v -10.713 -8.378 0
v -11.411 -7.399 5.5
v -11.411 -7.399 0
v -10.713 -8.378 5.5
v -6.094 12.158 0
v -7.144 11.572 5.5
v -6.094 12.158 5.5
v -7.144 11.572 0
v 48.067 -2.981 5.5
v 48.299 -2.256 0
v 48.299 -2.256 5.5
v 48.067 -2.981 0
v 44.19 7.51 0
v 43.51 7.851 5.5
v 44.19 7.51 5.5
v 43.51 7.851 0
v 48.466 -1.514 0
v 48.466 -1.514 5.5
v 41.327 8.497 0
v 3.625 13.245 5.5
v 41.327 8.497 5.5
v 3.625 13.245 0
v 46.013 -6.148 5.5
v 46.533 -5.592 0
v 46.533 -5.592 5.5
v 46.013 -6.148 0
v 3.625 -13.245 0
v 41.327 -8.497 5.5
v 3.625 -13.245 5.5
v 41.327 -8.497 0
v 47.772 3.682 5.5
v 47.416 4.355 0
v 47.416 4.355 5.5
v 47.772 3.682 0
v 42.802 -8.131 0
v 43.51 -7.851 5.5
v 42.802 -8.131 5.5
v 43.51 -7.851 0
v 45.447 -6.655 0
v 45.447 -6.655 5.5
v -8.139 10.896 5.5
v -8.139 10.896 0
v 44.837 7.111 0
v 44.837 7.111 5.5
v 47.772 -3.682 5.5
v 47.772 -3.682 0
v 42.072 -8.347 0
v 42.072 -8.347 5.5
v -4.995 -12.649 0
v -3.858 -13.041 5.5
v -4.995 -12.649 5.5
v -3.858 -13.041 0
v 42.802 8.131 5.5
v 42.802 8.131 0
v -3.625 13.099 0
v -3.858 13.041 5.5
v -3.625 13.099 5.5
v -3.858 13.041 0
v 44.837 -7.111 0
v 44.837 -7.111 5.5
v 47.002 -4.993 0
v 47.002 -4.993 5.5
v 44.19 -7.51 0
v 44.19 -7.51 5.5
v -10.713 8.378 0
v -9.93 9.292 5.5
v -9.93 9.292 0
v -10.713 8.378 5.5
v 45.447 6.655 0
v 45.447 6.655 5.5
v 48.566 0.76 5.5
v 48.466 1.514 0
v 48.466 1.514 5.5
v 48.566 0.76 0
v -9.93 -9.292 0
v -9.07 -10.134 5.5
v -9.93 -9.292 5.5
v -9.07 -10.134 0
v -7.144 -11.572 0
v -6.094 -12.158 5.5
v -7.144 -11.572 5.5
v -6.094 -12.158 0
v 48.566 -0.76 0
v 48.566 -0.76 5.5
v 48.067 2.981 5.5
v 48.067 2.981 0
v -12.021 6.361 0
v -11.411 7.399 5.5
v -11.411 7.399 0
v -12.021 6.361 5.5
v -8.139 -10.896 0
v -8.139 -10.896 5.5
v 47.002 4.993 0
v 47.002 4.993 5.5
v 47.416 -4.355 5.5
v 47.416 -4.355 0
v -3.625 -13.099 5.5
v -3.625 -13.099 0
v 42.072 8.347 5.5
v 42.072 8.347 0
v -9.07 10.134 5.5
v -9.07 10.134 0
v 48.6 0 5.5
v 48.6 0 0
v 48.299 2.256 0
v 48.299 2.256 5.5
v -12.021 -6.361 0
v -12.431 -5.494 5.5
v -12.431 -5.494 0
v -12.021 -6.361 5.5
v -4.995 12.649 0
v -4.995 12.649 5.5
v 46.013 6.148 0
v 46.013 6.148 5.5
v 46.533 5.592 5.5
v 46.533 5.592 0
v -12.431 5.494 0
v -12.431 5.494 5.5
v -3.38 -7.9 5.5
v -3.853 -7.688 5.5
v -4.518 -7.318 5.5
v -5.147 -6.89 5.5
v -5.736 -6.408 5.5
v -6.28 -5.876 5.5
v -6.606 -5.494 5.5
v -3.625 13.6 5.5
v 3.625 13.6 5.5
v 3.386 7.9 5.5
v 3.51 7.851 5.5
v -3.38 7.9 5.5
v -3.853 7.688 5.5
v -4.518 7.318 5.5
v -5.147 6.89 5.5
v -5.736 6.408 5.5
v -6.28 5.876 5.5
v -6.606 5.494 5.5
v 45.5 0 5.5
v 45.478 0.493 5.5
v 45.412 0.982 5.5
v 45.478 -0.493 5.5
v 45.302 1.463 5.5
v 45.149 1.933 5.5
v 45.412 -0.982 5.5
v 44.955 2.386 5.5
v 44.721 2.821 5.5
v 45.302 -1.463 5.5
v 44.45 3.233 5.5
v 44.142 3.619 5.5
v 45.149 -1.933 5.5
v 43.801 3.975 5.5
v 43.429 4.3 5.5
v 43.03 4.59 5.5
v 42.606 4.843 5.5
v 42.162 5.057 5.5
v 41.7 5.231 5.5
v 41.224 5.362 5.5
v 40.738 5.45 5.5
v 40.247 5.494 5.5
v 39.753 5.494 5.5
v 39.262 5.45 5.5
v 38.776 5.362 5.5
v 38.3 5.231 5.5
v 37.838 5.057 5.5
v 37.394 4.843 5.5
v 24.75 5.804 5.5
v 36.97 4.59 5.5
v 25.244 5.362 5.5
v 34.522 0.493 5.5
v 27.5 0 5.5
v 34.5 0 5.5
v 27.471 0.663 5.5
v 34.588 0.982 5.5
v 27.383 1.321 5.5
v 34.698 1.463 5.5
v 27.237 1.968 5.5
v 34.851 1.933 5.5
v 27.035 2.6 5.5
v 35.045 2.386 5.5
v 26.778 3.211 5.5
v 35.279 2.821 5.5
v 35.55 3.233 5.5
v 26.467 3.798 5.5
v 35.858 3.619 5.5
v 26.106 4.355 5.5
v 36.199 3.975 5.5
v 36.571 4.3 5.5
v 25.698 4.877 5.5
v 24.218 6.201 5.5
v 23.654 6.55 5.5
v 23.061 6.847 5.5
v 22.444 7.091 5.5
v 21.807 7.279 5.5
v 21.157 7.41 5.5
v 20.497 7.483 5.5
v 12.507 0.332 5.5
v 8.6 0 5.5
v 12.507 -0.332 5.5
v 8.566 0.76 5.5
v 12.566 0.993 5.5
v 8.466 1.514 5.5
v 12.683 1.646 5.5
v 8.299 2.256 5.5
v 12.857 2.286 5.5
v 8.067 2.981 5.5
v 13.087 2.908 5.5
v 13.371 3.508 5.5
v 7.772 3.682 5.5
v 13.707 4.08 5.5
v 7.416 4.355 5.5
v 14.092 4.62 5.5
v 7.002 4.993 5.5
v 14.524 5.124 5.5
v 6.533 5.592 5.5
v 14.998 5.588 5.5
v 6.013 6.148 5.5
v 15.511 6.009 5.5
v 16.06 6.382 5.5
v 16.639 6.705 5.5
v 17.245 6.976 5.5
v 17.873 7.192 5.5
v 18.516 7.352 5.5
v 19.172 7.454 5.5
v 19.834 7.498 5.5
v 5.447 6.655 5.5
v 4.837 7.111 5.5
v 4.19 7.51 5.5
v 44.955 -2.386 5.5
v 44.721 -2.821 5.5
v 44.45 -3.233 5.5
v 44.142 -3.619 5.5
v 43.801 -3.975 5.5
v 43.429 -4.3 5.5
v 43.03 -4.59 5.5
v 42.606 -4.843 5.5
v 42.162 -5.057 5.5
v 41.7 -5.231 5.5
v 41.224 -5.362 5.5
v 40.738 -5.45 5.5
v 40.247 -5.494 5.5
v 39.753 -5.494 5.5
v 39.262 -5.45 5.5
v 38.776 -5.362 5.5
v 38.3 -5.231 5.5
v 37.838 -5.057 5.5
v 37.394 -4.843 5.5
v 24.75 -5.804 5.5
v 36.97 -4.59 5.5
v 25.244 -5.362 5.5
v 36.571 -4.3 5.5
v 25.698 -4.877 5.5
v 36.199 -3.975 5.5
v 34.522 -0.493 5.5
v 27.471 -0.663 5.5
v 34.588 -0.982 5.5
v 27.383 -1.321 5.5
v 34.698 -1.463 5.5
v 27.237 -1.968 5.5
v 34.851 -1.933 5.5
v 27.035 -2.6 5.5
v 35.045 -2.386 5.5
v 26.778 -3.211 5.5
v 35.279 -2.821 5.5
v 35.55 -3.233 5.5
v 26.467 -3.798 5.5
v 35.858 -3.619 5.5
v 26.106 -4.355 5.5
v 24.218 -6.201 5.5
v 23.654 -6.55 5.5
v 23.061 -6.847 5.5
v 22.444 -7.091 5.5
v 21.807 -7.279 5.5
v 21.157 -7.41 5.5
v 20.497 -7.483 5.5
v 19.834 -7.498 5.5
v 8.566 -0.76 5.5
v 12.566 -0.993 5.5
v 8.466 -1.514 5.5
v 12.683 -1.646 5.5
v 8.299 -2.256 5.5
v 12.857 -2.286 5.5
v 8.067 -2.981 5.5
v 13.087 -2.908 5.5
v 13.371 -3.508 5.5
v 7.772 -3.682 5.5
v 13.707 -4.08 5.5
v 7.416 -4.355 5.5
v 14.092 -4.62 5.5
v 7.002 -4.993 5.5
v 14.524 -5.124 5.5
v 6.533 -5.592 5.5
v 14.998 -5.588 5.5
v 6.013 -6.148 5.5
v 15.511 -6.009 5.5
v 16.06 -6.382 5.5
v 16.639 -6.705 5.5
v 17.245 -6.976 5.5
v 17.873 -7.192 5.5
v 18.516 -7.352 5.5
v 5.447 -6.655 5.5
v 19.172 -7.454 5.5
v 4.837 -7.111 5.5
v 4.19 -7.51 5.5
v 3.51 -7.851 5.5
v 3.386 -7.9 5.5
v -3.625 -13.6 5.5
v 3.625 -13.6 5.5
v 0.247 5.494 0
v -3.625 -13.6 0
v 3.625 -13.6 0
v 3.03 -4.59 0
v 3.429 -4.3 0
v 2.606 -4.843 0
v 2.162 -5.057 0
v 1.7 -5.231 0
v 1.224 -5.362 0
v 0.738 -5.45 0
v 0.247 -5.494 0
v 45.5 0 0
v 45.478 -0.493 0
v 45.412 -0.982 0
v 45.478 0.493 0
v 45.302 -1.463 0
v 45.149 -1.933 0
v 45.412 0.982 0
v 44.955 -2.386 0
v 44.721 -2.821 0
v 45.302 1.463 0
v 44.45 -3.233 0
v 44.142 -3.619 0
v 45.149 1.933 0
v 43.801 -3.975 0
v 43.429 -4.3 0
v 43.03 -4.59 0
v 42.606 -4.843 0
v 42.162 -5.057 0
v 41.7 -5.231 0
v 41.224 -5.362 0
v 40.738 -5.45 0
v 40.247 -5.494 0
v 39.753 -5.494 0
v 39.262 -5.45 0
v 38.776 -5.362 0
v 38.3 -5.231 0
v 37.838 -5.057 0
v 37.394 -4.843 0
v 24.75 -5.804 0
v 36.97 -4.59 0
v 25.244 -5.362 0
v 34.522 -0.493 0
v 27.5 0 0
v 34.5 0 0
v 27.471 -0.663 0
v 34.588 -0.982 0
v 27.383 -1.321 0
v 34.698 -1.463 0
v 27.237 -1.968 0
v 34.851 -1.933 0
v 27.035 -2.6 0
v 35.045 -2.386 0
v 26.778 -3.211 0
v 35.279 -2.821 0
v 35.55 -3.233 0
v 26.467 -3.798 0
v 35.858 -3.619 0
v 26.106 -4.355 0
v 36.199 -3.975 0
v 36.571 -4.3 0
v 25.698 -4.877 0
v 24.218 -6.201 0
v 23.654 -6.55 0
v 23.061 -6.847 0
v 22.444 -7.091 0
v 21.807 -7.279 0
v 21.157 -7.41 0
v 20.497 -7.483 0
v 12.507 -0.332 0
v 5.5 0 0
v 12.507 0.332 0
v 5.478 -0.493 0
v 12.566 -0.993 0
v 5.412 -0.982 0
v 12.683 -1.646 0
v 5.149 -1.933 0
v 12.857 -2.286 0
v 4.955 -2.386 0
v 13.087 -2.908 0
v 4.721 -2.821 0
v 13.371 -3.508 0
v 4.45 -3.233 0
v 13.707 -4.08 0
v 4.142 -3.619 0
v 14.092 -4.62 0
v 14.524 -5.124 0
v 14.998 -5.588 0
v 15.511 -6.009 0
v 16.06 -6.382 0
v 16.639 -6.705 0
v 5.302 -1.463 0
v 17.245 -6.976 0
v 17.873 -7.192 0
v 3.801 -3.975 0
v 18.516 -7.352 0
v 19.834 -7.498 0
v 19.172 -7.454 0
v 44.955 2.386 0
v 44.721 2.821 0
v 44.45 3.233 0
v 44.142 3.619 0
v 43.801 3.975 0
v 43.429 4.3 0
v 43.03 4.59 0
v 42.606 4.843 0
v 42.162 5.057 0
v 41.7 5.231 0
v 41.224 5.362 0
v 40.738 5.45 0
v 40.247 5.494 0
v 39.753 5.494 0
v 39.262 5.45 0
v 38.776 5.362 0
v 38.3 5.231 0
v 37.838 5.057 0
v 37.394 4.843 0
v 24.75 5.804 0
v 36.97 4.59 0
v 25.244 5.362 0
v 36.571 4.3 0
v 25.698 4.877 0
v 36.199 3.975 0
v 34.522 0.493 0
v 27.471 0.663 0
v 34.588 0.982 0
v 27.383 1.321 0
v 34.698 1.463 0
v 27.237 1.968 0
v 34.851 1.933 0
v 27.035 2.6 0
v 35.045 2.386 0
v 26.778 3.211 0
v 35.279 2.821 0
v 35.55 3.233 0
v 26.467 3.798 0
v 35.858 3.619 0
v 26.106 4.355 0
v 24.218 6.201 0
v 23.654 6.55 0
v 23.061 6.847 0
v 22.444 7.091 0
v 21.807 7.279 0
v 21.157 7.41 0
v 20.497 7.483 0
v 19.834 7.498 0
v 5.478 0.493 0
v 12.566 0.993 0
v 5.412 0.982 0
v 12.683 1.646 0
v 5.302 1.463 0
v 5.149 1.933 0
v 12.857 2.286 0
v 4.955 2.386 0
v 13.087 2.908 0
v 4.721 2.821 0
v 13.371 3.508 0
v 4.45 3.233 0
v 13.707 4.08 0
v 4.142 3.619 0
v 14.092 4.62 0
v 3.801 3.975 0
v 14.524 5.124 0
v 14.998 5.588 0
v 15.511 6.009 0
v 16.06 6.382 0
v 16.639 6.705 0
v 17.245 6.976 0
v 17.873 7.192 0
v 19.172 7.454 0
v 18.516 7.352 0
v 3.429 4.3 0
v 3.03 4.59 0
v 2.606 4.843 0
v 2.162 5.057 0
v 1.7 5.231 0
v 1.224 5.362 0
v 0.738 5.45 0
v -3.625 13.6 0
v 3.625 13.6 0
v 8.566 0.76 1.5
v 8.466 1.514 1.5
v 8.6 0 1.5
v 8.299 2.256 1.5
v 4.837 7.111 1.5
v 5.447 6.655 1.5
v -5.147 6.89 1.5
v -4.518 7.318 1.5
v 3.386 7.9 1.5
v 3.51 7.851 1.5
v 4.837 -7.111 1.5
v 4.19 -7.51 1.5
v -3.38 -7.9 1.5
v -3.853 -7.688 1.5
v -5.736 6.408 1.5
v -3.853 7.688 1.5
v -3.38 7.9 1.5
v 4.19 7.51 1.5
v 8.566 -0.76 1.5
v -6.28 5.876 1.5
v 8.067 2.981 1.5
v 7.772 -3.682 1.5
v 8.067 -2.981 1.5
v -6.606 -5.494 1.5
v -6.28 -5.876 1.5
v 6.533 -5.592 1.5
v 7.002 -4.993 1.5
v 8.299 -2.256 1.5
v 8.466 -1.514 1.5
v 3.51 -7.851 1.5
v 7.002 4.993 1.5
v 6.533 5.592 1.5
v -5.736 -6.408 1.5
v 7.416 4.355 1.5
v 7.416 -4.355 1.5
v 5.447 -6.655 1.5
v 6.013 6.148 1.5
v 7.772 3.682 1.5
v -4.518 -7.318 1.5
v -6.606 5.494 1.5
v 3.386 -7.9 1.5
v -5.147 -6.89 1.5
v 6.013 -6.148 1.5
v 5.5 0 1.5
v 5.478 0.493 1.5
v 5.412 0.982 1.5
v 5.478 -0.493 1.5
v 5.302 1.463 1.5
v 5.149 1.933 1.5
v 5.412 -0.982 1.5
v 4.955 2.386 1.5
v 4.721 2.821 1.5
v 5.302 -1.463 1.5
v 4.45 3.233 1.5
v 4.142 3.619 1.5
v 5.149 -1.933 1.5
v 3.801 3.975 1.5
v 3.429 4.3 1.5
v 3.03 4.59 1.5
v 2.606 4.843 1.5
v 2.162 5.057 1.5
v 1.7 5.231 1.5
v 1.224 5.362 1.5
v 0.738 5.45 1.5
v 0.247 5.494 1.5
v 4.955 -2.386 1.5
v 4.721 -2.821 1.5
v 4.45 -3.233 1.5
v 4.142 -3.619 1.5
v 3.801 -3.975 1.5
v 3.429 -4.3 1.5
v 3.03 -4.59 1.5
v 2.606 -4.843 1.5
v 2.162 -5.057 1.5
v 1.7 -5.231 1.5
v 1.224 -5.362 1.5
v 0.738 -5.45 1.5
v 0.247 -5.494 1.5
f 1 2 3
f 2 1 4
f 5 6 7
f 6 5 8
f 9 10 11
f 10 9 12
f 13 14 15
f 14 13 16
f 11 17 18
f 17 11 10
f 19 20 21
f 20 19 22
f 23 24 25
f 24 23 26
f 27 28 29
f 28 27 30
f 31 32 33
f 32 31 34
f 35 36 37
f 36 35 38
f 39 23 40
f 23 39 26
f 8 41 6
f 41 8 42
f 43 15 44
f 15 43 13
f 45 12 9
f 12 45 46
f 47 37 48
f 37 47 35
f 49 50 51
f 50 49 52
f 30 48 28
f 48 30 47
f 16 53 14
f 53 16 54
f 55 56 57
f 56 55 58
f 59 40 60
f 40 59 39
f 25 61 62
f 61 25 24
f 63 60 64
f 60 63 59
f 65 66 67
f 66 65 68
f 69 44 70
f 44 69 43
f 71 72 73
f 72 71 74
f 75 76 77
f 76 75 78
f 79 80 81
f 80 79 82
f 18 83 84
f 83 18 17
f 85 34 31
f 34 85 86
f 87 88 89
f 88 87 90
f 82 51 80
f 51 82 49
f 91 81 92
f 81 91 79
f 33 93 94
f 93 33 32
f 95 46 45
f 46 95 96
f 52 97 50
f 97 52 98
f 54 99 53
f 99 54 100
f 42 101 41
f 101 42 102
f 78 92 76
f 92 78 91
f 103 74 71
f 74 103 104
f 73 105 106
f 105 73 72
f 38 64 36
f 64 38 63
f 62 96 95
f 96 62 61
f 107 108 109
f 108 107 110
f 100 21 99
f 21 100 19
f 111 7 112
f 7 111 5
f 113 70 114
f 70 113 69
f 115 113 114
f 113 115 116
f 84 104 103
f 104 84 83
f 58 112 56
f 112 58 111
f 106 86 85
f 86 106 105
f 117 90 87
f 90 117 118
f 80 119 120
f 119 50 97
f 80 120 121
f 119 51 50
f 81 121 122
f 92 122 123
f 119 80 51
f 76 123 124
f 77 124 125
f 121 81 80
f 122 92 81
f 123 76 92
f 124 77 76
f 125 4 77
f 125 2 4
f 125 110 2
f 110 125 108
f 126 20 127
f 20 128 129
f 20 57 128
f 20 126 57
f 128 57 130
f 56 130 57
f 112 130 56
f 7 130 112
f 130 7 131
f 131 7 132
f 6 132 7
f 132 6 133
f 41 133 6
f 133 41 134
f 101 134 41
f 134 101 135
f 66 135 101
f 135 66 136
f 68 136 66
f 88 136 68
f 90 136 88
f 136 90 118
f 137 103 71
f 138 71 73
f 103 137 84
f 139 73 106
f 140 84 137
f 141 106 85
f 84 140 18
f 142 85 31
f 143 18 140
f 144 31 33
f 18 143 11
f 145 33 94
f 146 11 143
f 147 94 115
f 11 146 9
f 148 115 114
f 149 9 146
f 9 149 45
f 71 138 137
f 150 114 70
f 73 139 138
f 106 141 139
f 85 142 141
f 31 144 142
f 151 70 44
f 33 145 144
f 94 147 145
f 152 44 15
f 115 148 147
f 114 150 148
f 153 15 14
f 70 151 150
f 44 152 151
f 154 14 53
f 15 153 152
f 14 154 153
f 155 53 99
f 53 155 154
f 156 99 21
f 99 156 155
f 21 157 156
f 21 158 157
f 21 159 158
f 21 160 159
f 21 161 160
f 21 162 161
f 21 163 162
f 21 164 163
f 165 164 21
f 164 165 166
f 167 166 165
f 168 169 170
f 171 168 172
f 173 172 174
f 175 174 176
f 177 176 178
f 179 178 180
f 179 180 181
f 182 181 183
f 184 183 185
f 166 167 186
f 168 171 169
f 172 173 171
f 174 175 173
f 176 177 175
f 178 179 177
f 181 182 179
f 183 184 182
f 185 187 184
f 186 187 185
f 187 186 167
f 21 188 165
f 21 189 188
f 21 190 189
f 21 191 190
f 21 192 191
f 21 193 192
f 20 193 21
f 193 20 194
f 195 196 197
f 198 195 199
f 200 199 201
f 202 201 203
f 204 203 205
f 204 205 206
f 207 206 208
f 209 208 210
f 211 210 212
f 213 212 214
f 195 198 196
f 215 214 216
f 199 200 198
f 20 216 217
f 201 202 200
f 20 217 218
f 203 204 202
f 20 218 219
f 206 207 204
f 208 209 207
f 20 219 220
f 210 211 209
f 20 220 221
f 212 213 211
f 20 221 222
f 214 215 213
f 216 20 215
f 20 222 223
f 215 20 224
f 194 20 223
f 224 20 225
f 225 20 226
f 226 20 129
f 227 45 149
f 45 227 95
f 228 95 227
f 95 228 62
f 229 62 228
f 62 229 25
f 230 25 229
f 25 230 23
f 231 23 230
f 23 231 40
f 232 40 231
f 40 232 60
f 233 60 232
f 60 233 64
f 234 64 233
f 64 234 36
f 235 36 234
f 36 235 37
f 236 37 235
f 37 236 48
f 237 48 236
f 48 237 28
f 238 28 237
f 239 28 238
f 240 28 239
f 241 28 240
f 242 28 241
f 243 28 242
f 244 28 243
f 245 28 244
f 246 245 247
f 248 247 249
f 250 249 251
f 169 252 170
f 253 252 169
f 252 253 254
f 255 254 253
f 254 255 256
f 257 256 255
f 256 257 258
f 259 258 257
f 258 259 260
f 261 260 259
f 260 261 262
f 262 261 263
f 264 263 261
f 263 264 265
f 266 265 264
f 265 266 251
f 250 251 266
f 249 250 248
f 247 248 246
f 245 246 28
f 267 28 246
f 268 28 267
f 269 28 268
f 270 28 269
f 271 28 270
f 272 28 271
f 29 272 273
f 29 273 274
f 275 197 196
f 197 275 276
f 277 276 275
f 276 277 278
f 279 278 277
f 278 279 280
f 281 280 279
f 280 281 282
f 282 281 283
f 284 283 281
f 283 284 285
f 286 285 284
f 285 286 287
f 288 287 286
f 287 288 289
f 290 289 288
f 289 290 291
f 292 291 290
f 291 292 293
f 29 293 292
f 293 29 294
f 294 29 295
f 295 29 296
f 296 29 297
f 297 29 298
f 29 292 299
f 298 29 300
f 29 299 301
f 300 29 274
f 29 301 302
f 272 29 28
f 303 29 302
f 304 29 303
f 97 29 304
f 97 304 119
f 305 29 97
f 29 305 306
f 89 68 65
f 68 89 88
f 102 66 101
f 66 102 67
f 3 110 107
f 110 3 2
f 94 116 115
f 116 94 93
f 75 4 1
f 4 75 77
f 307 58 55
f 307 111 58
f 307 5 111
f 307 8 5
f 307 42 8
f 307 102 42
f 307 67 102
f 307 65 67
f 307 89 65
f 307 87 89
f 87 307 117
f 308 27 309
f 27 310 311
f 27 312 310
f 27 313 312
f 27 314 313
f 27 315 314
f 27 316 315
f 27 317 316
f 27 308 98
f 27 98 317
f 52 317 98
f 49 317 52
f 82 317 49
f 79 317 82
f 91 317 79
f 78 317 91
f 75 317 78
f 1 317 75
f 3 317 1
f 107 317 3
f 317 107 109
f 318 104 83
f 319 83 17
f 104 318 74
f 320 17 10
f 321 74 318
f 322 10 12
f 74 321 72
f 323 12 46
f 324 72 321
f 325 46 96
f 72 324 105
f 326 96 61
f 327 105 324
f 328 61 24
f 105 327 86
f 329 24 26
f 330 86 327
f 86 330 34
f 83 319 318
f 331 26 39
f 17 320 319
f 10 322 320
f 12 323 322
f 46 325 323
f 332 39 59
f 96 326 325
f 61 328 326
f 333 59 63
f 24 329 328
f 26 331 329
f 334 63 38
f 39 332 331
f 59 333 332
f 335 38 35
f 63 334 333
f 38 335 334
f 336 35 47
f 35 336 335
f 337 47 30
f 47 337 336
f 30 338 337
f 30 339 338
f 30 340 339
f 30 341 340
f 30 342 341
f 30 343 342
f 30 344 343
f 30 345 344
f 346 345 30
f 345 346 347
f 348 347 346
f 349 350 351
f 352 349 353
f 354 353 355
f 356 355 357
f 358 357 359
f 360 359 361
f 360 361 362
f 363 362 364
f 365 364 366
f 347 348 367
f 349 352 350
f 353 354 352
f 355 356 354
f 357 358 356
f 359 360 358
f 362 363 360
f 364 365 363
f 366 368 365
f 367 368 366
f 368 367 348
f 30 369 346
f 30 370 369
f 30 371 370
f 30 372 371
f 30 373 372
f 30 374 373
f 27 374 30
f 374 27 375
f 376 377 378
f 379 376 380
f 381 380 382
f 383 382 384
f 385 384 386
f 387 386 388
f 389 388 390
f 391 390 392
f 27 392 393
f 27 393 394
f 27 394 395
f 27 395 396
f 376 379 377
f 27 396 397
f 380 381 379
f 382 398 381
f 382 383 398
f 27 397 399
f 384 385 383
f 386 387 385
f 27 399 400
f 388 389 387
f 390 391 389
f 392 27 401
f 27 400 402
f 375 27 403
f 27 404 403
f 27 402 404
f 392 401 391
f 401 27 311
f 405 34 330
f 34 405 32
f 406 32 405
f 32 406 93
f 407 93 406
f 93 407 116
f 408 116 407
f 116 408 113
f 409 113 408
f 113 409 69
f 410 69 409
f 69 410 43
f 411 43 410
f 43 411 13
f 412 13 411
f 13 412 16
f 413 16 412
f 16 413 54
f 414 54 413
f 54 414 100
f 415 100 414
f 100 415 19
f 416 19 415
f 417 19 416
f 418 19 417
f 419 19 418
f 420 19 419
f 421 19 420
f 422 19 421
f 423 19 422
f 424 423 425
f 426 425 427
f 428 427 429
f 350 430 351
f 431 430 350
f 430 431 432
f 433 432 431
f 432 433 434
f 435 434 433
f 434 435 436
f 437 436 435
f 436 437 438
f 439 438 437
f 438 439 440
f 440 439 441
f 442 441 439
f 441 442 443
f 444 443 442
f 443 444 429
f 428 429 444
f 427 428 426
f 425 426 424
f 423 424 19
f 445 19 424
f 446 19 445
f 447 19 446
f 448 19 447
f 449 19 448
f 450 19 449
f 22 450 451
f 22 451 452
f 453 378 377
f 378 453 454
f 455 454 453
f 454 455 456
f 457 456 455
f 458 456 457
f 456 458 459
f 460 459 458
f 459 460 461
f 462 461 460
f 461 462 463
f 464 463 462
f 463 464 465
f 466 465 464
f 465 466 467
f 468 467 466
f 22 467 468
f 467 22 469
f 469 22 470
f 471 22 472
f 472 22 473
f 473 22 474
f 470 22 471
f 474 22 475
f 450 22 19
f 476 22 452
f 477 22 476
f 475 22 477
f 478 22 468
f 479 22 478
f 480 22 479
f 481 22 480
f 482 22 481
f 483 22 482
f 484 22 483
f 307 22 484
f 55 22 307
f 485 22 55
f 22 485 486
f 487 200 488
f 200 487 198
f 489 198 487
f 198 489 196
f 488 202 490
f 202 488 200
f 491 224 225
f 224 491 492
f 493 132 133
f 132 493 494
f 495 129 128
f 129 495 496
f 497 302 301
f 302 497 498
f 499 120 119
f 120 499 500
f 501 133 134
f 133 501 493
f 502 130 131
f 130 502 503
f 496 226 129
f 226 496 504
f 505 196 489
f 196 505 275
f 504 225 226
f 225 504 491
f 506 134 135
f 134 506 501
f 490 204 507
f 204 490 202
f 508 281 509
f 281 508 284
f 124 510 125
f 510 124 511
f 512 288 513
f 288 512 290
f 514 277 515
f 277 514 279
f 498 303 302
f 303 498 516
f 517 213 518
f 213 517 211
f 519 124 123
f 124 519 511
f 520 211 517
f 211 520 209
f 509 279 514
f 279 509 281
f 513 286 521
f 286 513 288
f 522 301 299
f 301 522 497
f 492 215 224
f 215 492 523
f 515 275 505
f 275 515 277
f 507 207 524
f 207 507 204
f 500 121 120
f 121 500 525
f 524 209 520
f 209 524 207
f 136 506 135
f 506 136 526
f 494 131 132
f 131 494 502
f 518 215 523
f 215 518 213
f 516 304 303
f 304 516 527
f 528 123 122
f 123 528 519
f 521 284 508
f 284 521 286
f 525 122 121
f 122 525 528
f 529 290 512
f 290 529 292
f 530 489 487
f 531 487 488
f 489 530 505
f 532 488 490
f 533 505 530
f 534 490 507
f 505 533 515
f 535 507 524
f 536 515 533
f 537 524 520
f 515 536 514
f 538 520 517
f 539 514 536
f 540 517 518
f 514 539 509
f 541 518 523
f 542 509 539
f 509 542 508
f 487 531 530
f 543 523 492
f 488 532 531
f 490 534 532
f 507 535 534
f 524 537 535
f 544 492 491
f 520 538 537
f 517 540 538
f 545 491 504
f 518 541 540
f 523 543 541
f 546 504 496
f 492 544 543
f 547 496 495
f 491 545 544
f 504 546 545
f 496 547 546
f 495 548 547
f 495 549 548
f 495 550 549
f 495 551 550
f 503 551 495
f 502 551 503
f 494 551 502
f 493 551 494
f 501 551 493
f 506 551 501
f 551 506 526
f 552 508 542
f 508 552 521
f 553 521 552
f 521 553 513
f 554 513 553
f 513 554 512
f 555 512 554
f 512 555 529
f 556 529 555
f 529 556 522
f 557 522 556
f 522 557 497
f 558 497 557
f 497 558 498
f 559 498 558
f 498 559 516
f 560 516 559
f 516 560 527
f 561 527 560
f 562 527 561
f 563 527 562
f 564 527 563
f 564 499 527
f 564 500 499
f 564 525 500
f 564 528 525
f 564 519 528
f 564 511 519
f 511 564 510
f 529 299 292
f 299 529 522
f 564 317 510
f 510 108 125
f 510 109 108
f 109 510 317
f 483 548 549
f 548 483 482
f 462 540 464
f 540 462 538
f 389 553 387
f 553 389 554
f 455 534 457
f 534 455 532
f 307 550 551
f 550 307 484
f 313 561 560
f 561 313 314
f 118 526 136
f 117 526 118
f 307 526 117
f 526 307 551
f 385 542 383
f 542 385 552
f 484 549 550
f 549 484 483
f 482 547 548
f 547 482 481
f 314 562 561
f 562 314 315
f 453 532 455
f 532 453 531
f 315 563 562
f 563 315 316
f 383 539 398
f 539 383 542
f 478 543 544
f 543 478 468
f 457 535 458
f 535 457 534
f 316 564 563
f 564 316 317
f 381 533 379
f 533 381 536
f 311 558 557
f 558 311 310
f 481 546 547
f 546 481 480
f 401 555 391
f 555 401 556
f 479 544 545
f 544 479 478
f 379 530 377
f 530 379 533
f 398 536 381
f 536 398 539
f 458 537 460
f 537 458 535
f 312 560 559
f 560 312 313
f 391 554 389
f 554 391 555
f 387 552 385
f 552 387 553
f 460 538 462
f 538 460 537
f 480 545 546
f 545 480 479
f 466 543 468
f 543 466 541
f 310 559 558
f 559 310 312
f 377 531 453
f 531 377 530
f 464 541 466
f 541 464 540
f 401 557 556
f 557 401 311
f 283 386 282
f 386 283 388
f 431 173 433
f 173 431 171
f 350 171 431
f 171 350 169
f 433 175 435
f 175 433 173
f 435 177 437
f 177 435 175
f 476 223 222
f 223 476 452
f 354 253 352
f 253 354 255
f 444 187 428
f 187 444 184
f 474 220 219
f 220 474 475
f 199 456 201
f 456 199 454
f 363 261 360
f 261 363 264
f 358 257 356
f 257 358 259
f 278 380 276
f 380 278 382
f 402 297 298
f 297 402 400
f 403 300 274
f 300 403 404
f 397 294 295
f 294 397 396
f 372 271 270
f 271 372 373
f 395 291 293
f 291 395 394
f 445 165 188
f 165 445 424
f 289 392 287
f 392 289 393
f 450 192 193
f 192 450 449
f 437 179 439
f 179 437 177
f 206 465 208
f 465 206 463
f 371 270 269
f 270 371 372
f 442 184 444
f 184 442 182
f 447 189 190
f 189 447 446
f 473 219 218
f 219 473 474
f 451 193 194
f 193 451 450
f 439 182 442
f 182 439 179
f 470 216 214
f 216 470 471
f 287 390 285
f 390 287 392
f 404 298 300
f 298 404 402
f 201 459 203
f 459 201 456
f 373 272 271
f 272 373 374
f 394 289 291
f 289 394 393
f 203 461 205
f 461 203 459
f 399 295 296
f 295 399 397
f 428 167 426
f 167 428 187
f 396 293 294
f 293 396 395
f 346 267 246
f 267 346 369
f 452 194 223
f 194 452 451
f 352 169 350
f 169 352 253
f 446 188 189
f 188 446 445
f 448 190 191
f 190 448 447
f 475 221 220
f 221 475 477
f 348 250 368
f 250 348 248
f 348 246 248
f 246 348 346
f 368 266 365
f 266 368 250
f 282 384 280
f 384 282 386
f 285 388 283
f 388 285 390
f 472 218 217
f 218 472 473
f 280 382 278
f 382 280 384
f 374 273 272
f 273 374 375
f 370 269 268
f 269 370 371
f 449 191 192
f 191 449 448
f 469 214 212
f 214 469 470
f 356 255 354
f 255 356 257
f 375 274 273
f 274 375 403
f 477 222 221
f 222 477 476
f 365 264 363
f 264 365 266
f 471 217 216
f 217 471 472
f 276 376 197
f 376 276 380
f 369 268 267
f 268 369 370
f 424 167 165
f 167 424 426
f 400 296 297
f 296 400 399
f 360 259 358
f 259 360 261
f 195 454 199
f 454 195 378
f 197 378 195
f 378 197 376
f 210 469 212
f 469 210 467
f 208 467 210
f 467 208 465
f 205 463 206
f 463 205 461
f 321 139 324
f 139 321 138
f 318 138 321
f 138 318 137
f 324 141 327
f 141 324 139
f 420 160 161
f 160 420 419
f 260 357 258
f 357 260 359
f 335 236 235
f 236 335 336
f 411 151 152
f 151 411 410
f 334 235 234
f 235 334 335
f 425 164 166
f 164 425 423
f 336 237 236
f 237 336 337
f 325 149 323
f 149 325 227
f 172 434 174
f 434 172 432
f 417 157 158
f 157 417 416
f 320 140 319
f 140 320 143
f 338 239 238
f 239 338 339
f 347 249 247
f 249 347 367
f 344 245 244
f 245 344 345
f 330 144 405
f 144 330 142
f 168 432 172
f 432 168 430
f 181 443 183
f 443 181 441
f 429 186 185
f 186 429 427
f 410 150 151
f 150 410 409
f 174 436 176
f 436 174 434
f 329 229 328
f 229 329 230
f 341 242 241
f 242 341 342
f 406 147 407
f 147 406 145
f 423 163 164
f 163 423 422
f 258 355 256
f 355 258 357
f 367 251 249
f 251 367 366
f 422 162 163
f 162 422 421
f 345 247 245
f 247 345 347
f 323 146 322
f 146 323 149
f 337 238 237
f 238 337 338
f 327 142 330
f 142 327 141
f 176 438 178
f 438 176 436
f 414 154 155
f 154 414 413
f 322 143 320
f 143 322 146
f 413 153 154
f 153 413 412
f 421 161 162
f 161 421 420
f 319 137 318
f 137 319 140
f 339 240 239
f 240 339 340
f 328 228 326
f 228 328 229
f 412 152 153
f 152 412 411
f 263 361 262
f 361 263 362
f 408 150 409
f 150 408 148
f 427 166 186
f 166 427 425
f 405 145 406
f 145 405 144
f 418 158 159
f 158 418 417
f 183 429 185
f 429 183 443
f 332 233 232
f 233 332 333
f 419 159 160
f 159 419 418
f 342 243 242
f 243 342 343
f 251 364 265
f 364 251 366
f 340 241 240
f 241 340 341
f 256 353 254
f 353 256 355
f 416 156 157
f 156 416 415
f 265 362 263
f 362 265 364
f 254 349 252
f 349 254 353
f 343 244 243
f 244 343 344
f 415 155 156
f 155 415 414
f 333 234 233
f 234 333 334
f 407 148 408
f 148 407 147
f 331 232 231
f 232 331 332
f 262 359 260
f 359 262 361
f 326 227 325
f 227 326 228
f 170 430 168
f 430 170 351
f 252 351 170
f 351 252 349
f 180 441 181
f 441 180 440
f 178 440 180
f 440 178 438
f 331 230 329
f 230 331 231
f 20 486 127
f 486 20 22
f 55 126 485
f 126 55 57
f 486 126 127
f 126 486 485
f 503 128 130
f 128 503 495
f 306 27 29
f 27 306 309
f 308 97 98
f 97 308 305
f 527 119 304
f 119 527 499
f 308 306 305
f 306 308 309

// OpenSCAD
//
slot_distance = 15.8;
plunger_diameter = 17.2;
tool_wall = 5;
tool_h = 5.5;
tool_slot_h = 4;

hole_d = 11;

$fs = 0.5;
$fa = 5.1;
wrench();
module wrench() {
    union() {
        difference() {
            union() {
                hull() {
                    translate([0,0,0]) cylinder(d=plunger_diameter+tool_wall*2, h=tool_h);
                    translate([40,0,0]) cylinder(d=plunger_diameter, h=tool_h);
                }
            }
            translate([0,0,tool_h-tool_slot_h]) cylinder(d=plunger_diameter, h=tool_h);
                
                
            hull() {
                translate([0,0,0]) cylinder(d=hole_d, h=tool_h);
                translate([-40,0,0]) cylinder(d=hole_d, h=tool_h);
            }
            translate([20,0,0]) cylinder(d=15, h=tool_h);
            translate([40,0,0]) cylinder(d=hole_d, h=tool_h);
            
        }
        slot_x = (plunger_diameter/2+tool_wall) - slot_distance/2;
        translate([-7.25/2,slot_distance/2,0]) cube([7.25, slot_x, tool_h]);
        
        translate([-7.25/2,-slot_distance/2-slot_x,0]) cube([7.25, slot_x, tool_h]);
    }
}
